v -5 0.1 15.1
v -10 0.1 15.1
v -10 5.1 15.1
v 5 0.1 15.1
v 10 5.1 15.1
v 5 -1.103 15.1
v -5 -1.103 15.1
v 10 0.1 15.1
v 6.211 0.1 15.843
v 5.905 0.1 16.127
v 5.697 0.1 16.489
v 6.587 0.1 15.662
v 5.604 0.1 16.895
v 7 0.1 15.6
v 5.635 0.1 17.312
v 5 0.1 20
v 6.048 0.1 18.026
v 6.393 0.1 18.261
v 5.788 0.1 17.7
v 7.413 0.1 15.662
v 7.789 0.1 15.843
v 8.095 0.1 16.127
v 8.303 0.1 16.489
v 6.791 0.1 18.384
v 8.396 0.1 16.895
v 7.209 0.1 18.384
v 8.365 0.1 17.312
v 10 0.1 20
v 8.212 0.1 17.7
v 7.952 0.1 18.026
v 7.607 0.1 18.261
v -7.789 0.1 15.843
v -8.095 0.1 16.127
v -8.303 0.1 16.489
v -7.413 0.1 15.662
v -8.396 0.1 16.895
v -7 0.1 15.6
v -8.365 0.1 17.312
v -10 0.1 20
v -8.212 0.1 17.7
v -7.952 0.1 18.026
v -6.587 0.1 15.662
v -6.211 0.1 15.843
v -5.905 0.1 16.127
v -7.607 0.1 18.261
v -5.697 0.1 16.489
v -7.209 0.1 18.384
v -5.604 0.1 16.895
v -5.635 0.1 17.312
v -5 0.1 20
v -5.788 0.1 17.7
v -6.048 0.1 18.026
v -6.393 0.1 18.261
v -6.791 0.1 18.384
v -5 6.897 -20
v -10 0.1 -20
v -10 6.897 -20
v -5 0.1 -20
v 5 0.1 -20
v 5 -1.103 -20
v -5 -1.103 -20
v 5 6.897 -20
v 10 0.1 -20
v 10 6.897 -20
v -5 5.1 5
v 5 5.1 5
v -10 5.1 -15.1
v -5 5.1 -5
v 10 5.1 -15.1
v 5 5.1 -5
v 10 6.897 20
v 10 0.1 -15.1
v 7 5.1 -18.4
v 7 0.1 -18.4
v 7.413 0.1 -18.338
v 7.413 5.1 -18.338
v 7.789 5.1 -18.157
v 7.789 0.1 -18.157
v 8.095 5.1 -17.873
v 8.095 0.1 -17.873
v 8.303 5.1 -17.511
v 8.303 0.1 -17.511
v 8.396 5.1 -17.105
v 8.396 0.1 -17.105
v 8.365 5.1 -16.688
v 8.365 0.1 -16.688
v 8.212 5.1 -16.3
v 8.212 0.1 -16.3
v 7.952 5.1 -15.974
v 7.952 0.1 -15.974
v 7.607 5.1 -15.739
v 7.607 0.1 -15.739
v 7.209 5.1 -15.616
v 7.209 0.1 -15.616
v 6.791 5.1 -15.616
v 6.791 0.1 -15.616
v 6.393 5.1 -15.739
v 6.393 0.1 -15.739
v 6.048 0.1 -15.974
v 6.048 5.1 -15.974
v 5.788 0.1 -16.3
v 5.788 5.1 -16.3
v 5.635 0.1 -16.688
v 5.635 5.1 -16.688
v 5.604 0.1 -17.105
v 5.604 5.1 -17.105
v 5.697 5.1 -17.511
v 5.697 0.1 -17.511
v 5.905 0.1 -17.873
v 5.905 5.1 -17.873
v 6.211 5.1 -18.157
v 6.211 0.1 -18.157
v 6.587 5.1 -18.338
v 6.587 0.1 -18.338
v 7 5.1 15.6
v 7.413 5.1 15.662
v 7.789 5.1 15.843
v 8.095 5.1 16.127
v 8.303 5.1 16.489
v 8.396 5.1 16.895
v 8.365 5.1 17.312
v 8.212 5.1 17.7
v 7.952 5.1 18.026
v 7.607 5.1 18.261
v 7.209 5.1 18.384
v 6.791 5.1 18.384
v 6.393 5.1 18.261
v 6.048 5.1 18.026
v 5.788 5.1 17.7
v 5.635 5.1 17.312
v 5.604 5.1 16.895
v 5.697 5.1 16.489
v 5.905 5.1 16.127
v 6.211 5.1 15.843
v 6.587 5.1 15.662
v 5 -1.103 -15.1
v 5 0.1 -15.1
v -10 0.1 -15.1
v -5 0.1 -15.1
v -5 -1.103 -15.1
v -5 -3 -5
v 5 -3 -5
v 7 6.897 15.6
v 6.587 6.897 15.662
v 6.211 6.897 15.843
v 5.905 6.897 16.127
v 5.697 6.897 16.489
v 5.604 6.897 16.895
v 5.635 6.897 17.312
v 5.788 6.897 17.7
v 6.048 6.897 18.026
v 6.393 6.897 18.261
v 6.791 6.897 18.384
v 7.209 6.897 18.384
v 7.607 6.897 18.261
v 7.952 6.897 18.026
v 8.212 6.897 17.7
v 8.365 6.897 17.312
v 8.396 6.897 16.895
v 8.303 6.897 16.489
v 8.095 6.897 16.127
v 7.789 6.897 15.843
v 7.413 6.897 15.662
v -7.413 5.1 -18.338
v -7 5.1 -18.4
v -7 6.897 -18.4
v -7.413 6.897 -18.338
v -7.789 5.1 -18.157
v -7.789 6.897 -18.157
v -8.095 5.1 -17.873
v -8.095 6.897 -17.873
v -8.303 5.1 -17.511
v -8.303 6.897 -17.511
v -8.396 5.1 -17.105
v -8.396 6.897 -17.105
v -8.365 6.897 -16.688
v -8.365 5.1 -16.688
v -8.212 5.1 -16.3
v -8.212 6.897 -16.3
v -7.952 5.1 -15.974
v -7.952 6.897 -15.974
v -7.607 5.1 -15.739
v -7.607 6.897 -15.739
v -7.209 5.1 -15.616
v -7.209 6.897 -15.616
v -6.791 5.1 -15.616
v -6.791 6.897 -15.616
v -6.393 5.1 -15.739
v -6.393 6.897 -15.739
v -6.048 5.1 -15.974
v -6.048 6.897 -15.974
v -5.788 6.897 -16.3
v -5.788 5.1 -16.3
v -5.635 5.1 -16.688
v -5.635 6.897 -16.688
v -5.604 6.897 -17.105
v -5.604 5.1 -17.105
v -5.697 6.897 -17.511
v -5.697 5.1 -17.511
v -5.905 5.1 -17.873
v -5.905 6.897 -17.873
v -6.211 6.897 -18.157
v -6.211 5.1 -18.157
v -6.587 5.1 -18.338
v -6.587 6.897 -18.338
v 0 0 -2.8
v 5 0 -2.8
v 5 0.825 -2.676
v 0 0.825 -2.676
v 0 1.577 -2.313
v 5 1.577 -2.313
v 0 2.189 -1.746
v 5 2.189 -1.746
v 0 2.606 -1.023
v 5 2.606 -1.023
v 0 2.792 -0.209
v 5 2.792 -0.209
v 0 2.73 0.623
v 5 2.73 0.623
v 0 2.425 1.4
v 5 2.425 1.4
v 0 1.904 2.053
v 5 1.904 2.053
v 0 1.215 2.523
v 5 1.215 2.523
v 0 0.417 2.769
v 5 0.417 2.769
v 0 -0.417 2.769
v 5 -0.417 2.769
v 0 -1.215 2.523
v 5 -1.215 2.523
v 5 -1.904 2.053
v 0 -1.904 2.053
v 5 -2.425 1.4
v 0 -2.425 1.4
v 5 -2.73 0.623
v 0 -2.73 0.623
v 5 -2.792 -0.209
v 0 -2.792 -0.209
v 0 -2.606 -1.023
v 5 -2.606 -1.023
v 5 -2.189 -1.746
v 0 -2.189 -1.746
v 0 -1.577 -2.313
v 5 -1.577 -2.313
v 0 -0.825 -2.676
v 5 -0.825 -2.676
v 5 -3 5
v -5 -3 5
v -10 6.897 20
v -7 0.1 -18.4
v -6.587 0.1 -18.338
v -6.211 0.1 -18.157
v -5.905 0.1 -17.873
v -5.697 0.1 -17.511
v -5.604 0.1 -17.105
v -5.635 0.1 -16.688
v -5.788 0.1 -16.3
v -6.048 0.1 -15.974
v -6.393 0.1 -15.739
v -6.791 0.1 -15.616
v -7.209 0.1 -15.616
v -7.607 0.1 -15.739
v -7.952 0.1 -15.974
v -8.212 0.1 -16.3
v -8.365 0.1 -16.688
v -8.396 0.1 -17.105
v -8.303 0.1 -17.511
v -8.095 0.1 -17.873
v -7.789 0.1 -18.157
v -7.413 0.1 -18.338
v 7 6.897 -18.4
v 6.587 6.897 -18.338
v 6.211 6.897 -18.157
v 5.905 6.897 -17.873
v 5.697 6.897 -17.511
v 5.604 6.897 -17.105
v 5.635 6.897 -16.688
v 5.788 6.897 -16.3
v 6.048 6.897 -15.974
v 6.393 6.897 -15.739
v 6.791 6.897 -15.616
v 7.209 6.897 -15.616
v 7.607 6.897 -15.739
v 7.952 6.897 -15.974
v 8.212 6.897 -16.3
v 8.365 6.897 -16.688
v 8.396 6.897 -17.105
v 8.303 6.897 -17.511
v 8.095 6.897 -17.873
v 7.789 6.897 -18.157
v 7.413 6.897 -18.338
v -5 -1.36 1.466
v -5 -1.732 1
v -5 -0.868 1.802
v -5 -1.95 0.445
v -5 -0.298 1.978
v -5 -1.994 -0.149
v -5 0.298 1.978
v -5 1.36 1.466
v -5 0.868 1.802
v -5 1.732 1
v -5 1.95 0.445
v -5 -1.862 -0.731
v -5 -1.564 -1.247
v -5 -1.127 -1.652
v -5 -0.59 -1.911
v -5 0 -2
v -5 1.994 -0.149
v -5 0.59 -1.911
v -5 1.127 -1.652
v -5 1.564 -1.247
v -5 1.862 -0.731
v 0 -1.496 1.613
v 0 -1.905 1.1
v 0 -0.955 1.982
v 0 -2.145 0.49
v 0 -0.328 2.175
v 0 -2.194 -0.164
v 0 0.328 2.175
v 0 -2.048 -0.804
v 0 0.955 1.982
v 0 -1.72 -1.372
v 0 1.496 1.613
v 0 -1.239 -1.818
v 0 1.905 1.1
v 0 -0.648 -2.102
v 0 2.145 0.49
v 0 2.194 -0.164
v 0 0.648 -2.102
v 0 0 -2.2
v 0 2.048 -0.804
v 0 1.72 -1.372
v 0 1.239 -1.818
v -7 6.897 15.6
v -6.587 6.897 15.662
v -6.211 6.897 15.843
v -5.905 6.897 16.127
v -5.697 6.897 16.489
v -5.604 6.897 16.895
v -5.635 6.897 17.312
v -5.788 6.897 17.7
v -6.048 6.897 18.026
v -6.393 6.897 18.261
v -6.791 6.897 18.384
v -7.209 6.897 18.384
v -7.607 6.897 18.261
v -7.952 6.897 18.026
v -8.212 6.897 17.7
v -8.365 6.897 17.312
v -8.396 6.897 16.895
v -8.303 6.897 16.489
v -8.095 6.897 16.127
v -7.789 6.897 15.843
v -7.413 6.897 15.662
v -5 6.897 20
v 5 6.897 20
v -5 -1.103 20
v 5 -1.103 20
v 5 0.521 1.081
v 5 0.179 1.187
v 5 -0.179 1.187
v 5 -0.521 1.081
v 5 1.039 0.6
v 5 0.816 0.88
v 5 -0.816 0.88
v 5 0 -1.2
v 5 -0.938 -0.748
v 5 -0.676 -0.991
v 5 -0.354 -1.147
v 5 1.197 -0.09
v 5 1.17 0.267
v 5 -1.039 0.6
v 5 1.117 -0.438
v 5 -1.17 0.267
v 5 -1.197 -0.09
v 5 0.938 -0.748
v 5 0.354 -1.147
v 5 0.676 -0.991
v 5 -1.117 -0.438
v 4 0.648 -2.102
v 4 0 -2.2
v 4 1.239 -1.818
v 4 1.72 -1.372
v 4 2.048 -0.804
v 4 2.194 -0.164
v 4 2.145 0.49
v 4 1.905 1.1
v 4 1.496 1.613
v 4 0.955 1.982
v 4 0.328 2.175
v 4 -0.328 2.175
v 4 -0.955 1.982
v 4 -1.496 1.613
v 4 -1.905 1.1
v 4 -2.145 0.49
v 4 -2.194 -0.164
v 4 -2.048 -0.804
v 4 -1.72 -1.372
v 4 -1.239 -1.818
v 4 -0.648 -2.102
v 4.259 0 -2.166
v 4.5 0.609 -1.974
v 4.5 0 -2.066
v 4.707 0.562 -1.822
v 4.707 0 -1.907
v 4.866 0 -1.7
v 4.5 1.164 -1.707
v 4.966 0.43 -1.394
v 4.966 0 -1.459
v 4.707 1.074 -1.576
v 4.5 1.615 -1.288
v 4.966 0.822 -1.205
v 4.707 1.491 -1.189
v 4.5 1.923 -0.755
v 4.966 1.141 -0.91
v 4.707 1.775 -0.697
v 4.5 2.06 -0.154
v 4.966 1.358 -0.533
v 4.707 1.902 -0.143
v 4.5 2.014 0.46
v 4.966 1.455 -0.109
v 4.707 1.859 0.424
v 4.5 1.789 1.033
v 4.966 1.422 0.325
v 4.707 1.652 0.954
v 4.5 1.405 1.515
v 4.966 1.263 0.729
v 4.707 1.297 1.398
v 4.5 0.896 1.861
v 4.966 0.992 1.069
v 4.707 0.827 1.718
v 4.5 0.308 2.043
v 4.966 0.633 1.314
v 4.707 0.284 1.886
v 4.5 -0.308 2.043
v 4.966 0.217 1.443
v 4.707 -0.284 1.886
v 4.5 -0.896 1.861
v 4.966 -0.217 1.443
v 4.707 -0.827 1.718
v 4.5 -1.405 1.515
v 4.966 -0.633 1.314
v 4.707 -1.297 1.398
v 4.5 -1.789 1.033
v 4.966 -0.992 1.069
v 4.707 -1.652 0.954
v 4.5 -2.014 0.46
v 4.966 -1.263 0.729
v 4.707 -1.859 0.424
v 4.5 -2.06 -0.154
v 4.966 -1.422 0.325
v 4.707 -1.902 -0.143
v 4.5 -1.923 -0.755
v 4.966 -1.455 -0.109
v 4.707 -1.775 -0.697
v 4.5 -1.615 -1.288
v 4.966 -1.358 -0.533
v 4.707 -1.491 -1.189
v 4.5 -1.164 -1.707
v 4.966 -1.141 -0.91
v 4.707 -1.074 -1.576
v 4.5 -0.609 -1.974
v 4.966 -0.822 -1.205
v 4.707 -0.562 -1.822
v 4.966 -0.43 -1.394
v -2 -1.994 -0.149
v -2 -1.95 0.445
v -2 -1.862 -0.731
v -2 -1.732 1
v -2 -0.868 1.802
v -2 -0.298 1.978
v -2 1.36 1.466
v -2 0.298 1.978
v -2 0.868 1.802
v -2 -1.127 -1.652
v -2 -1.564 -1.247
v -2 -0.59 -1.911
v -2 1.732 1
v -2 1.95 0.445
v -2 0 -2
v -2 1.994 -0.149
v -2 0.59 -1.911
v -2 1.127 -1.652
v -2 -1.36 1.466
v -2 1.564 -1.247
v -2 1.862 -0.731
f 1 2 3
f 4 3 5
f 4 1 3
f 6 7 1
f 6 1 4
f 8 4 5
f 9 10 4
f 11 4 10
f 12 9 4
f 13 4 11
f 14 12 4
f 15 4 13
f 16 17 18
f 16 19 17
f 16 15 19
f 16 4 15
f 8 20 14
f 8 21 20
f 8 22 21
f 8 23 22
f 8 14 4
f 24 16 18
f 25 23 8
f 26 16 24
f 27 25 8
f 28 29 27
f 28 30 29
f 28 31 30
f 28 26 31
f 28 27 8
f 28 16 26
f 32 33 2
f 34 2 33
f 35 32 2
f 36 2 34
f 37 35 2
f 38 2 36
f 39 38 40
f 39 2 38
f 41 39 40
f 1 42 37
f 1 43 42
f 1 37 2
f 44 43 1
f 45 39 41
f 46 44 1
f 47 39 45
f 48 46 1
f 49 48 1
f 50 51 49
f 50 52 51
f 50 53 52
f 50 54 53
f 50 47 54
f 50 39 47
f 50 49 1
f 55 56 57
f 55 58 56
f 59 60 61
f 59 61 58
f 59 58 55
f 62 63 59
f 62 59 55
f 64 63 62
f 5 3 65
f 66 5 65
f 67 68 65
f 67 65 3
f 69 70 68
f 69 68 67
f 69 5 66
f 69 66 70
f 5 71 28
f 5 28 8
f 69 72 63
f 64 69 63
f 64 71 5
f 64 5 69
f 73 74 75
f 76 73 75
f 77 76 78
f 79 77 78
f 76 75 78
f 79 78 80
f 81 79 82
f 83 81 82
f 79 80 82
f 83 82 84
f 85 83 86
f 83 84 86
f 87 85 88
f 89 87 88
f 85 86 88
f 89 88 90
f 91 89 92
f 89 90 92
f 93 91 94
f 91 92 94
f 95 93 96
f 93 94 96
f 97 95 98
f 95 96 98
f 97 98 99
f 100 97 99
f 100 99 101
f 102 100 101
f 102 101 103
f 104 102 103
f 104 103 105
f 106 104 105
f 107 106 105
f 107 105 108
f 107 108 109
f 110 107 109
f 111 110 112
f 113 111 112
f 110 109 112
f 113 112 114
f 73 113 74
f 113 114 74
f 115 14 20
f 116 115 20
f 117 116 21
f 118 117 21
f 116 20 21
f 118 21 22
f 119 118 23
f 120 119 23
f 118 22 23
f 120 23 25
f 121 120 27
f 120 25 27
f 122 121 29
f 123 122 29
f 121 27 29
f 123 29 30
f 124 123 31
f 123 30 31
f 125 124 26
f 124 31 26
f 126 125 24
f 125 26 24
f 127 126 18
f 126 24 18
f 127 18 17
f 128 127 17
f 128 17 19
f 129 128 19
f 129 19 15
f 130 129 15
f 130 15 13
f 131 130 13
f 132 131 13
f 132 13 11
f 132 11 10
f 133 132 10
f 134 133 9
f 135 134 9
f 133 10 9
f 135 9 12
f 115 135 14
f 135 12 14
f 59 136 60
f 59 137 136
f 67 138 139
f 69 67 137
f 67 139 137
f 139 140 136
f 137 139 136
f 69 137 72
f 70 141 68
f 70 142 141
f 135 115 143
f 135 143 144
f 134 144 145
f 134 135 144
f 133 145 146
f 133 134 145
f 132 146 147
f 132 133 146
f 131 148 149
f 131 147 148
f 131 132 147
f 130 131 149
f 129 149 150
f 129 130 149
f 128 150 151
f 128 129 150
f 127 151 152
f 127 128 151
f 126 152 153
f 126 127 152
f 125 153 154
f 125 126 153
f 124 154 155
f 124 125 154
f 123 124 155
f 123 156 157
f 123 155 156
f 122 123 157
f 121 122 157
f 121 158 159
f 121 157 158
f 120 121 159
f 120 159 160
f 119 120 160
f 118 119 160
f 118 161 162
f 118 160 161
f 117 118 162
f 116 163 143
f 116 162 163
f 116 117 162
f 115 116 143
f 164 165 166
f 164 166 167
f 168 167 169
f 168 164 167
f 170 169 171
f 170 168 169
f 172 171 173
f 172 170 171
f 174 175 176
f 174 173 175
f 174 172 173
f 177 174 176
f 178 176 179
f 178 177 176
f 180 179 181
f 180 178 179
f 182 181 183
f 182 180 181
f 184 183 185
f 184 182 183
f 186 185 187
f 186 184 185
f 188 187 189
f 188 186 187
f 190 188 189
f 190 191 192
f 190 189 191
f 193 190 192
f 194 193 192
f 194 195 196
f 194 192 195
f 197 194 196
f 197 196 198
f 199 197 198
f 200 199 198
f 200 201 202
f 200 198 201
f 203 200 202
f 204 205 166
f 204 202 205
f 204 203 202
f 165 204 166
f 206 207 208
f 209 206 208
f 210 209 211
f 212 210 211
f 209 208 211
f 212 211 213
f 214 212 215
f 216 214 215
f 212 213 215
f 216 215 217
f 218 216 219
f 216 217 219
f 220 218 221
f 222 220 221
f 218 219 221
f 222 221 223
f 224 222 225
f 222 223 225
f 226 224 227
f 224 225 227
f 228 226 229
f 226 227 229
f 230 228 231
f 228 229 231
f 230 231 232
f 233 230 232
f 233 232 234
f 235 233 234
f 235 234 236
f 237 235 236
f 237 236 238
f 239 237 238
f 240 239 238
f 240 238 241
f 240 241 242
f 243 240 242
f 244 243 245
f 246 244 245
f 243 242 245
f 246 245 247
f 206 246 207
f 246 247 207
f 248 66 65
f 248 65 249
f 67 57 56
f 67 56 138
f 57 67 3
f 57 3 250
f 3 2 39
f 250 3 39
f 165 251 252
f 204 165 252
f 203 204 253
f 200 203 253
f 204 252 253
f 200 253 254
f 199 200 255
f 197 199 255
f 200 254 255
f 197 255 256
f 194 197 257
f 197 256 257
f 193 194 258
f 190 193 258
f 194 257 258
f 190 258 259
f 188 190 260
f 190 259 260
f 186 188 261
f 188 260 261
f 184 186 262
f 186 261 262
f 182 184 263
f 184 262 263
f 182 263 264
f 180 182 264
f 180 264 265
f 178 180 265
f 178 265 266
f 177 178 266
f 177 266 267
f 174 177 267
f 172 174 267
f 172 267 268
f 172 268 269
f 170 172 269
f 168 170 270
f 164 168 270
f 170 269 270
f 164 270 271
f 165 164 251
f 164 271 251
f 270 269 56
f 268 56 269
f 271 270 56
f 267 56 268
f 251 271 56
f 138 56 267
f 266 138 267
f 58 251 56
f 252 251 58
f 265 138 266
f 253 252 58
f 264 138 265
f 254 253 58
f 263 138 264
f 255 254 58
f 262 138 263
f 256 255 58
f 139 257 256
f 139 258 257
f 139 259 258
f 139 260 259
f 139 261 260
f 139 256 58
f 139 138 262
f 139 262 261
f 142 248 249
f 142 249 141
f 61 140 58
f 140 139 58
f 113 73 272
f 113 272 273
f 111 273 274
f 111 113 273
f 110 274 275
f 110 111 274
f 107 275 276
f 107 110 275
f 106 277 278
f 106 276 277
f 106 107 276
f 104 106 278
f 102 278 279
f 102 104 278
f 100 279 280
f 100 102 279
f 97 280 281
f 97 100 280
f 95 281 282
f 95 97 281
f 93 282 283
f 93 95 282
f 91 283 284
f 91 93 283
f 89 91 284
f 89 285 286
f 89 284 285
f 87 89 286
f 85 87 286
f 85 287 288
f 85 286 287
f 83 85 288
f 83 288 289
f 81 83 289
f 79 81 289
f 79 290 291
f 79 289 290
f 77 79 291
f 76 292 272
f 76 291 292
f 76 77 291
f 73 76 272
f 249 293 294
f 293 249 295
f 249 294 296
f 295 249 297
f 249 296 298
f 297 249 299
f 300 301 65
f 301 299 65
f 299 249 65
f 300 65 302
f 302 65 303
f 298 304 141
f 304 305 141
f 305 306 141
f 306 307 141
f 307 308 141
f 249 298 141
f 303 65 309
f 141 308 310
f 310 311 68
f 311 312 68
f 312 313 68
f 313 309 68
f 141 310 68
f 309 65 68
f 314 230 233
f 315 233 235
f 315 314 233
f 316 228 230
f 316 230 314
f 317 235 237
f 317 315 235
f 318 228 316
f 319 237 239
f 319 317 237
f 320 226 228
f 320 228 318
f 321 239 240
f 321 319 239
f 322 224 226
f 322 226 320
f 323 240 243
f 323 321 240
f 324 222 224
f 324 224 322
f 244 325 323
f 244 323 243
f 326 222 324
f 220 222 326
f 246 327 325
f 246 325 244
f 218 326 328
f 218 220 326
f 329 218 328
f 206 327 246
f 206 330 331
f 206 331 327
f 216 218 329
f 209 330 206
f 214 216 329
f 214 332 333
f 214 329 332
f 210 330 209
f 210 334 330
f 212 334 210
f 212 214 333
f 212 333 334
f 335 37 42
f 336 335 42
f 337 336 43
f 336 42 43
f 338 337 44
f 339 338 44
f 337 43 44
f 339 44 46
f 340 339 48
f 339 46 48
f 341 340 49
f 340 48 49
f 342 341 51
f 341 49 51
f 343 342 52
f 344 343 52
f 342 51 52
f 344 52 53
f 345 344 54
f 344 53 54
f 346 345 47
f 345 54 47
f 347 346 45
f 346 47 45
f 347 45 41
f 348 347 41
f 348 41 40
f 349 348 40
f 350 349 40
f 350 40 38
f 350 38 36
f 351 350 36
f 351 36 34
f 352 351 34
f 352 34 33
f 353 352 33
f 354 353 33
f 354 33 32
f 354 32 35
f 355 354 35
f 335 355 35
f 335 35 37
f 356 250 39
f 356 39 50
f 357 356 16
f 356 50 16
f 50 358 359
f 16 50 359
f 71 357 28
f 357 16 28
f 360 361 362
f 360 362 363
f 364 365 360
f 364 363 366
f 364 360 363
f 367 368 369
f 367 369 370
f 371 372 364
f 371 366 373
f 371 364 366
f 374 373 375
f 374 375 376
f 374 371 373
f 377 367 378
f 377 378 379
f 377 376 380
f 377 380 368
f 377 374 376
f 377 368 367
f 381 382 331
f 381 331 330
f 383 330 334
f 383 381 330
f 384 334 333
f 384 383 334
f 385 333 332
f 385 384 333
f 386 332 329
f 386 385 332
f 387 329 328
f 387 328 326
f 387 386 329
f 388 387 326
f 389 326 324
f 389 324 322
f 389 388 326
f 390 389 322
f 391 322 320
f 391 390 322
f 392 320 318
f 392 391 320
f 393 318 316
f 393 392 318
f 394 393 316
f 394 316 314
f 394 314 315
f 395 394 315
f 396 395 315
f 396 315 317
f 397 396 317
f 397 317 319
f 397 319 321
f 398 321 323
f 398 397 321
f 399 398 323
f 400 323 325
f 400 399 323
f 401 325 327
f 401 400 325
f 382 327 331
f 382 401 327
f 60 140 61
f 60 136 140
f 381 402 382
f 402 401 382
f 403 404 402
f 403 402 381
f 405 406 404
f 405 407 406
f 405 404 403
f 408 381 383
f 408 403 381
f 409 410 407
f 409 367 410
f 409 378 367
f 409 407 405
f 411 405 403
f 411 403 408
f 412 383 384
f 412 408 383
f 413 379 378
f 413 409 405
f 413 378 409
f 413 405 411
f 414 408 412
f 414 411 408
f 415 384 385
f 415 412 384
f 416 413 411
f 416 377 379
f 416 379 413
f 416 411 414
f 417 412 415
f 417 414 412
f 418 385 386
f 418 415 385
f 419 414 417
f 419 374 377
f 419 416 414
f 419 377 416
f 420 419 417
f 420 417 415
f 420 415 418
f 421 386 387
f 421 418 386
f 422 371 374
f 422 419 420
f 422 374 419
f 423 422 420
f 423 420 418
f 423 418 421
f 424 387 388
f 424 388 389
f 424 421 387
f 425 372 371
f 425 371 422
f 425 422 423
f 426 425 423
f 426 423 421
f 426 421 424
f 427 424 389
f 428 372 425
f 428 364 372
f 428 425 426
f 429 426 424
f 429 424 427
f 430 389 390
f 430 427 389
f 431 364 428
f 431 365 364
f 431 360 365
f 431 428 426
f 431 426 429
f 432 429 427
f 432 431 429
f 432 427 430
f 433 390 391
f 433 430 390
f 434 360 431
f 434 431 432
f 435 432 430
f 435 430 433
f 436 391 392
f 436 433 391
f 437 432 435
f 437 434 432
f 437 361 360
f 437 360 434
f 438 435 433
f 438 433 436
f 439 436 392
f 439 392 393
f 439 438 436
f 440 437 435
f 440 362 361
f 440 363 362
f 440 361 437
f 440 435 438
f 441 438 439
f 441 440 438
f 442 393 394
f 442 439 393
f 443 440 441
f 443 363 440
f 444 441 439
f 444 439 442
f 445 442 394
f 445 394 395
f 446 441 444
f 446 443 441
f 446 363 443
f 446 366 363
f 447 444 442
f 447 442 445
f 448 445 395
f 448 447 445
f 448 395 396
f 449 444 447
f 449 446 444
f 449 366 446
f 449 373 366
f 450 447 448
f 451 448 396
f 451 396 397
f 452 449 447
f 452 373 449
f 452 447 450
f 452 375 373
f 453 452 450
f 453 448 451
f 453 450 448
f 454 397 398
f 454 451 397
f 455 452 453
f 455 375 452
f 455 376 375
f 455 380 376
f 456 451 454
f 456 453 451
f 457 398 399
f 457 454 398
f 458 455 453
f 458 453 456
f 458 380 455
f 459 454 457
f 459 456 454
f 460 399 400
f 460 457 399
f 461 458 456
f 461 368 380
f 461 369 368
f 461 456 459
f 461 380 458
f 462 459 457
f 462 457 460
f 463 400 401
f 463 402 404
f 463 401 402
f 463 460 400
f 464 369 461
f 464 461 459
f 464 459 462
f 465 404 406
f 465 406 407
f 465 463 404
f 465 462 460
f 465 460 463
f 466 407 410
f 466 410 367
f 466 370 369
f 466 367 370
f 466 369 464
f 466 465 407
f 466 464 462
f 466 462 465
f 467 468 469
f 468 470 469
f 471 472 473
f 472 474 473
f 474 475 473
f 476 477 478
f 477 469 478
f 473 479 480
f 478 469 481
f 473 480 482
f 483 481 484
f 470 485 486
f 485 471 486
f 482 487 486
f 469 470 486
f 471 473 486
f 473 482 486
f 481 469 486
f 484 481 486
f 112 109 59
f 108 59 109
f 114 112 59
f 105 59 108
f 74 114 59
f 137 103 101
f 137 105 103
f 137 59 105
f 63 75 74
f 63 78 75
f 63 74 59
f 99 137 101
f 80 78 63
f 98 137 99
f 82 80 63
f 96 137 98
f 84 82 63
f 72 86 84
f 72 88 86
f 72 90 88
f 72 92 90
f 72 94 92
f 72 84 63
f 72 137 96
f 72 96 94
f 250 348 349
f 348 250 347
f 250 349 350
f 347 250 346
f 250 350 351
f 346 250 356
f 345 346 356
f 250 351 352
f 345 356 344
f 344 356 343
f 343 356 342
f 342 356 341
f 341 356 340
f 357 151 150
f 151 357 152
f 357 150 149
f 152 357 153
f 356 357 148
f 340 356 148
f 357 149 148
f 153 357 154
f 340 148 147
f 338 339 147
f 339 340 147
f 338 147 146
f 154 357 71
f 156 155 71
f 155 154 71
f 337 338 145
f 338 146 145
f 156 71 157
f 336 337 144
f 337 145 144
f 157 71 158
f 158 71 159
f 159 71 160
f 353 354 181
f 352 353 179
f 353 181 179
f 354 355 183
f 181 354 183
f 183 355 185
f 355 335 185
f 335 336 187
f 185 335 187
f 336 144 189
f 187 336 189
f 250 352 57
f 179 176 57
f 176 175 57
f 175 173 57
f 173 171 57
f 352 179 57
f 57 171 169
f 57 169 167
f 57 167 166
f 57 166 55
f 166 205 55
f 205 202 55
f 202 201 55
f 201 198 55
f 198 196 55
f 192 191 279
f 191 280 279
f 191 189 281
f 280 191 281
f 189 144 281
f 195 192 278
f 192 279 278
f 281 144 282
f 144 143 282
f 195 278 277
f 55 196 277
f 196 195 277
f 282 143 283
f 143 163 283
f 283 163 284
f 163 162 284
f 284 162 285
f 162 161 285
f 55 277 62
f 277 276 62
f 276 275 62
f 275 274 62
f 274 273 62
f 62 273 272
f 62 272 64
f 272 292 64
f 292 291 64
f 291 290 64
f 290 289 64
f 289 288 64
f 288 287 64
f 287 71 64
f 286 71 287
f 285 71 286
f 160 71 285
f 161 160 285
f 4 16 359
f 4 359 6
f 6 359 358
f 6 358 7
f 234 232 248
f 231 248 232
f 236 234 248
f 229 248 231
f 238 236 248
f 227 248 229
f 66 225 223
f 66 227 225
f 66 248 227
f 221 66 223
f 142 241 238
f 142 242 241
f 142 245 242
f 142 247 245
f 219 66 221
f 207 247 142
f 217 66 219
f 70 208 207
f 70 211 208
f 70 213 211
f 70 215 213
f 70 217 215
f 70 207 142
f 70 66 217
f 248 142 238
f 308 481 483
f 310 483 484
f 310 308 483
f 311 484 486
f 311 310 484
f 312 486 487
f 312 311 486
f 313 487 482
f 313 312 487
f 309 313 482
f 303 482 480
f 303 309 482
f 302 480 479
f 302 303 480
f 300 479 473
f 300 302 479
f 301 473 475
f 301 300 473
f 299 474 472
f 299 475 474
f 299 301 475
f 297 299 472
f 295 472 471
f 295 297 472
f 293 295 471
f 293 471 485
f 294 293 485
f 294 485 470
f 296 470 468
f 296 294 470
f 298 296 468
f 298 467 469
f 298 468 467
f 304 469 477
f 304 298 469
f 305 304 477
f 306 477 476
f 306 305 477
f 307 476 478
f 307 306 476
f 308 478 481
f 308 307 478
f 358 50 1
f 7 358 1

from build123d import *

# Parameters (mm, degrees)
SKETCH_1_R          = 2
EXTRUDE_1_DEPTH     = 5
SKETCH_3_W          = 40
SKETCH_3_H          = 1.796813629
EXTRUDE_2_DEPTH     = 10
SKETCH_4_R          = 1.4
CUT_EXTRUDE_2_DEPTH = 20
SKETCH_6_R          = 2.5
EXTRUDE_3_DEPTH     = 7
SKETCH_7_R          = 2.8
SKETCH_7_R_2        = 2.2
CUT_EXTRUDE_3_DEPTH = 5
FILLET_1_R          = 1
EXTRUDE_START       = 5
SKETCH_8_W          = 5
SKETCH_8_H          = 4.9
SKETCH_8_R          = 1.4
EXTRUDE_4_DEPTH     = 5


with BuildPart() as part:
    # 스케치1 → 보스-돌출1 (new, symmetric)
    with BuildSketch(Plane(origin=(0, 0, 0), x_dir=(0, 0, -1), z_dir=(1, 0, 0))):
        Polygon((20, 6.896813629), (-20, 6.896813629), (-20, -1.103186371), (-15.1, -1.103186371), (-15.1, 5.1), (-5, 5.1), (-5, -3), (5, -3), (5, 5.1), (15.1, 5.1), (15.1, -1.103186371), (20, -1.103186371), align=None)
        Circle(SKETCH_1_R, mode=Mode.SUBTRACT)
    extrude(amount=EXTRUDE_1_DEPTH, both=True)

    # 스케치3 → 보스-돌출2 (add, symmetric)
    with BuildSketch(Plane(origin=(0, 0, 0), x_dir=(0, 0, -1), z_dir=(1, 0, 0))):
        with Locations((0, 5.998406815)):
            Rectangle(SKETCH_3_W, SKETCH_3_H)
    extrude(amount=EXTRUDE_2_DEPTH, both=True)

    # 스케치4 → 컷-돌출2 (cut)
    with BuildSketch(Plane(origin=(0, 0, 0), x_dir=(1, 0, 0), z_dir=(0, 1, 0))):
        with Locations(Location((-7, -17, 0), (0, 0, 90))):
            Circle(SKETCH_4_R)
        with Locations(Location((7, -17, 0), (0, 0, 90))):
            Circle(SKETCH_4_R)
        with Locations(Location((7, 17, 0), (0, 0, 90))):
            Circle(SKETCH_4_R)
        with Locations(Location((-7, 17, 0), (0, 0, 90))):
            Circle(SKETCH_4_R)
    extrude(amount=CUT_EXTRUDE_2_DEPTH, mode=Mode.SUBTRACT)

    # 스케치6 → 보스-돌출3 (add)
    with BuildSketch(Plane(origin=(5, 0, 0), x_dir=(0, 0, -1), z_dir=(1, 0, 0))):
        Circle(SKETCH_6_R)
    extrude(amount=-EXTRUDE_3_DEPTH)

    # 스케치7 → 컷-돌출3 (cut)
    with BuildSketch(Plane(origin=(5, 0, 0), x_dir=(0, 0, -1), z_dir=(1, 0, 0))):
        Circle(SKETCH_7_R)
        Circle(SKETCH_7_R_2, mode=Mode.SUBTRACT)
    extrude(amount=-CUT_EXTRUDE_3_DEPTH, mode=Mode.SUBTRACT)

    # 필렛1
    fillet_1_edges = [part.edges().sort_by_distance(p)[0] for p in [
        (5, 0, 2.2),
    ]]
    fillet(fillet_1_edges, radius=FILLET_1_R)

    # 스케치8 → 보스-돌출4 (add)
    # profile 1 of 4: a face of its own
    with BuildSketch(Plane.XZ.offset(-5.1).offset(EXTRUDE_START)):
        with Locations((-7.5, 17.55)):
            Rectangle(SKETCH_8_W, SKETCH_8_H)
        with Locations(Location((-7, 17, 0), (0, 0, 270))):
            Circle(SKETCH_8_R, mode=Mode.SUBTRACT)
    # profile 2 of 4: a face of its own
    with BuildSketch(Plane.XZ.offset(-5.1).offset(EXTRUDE_START)):
        with Locations((7.5, 17.55)):
            Rectangle(SKETCH_8_W, SKETCH_8_H)
        with Locations(Location((7, 17, 0), (0, 0, 270))):
            Circle(SKETCH_8_R, mode=Mode.SUBTRACT)
    # profile 3 of 4: a face of its own
    with BuildSketch(Plane.XZ.offset(-5.1).offset(EXTRUDE_START)):
        with Locations((-7.5, -17.55)):
            Rectangle(SKETCH_8_W, SKETCH_8_H)
        with Locations(Location((-7, -17, 0), (0, 0, 270))):
            Circle(SKETCH_8_R, mode=Mode.SUBTRACT)
    # profile 4 of 4: a face of its own
    with BuildSketch(Plane.XZ.offset(-5.1).offset(EXTRUDE_START)):
        with Locations((7.5, -17.55)):
            Rectangle(SKETCH_8_W, SKETCH_8_H)
        with Locations(Location((7, -17, 0), (0, 0, 270))):
            Circle(SKETCH_8_R, mode=Mode.SUBTRACT)
    extrude(amount=-EXTRUDE_4_DEPTH)


solid = part.part
